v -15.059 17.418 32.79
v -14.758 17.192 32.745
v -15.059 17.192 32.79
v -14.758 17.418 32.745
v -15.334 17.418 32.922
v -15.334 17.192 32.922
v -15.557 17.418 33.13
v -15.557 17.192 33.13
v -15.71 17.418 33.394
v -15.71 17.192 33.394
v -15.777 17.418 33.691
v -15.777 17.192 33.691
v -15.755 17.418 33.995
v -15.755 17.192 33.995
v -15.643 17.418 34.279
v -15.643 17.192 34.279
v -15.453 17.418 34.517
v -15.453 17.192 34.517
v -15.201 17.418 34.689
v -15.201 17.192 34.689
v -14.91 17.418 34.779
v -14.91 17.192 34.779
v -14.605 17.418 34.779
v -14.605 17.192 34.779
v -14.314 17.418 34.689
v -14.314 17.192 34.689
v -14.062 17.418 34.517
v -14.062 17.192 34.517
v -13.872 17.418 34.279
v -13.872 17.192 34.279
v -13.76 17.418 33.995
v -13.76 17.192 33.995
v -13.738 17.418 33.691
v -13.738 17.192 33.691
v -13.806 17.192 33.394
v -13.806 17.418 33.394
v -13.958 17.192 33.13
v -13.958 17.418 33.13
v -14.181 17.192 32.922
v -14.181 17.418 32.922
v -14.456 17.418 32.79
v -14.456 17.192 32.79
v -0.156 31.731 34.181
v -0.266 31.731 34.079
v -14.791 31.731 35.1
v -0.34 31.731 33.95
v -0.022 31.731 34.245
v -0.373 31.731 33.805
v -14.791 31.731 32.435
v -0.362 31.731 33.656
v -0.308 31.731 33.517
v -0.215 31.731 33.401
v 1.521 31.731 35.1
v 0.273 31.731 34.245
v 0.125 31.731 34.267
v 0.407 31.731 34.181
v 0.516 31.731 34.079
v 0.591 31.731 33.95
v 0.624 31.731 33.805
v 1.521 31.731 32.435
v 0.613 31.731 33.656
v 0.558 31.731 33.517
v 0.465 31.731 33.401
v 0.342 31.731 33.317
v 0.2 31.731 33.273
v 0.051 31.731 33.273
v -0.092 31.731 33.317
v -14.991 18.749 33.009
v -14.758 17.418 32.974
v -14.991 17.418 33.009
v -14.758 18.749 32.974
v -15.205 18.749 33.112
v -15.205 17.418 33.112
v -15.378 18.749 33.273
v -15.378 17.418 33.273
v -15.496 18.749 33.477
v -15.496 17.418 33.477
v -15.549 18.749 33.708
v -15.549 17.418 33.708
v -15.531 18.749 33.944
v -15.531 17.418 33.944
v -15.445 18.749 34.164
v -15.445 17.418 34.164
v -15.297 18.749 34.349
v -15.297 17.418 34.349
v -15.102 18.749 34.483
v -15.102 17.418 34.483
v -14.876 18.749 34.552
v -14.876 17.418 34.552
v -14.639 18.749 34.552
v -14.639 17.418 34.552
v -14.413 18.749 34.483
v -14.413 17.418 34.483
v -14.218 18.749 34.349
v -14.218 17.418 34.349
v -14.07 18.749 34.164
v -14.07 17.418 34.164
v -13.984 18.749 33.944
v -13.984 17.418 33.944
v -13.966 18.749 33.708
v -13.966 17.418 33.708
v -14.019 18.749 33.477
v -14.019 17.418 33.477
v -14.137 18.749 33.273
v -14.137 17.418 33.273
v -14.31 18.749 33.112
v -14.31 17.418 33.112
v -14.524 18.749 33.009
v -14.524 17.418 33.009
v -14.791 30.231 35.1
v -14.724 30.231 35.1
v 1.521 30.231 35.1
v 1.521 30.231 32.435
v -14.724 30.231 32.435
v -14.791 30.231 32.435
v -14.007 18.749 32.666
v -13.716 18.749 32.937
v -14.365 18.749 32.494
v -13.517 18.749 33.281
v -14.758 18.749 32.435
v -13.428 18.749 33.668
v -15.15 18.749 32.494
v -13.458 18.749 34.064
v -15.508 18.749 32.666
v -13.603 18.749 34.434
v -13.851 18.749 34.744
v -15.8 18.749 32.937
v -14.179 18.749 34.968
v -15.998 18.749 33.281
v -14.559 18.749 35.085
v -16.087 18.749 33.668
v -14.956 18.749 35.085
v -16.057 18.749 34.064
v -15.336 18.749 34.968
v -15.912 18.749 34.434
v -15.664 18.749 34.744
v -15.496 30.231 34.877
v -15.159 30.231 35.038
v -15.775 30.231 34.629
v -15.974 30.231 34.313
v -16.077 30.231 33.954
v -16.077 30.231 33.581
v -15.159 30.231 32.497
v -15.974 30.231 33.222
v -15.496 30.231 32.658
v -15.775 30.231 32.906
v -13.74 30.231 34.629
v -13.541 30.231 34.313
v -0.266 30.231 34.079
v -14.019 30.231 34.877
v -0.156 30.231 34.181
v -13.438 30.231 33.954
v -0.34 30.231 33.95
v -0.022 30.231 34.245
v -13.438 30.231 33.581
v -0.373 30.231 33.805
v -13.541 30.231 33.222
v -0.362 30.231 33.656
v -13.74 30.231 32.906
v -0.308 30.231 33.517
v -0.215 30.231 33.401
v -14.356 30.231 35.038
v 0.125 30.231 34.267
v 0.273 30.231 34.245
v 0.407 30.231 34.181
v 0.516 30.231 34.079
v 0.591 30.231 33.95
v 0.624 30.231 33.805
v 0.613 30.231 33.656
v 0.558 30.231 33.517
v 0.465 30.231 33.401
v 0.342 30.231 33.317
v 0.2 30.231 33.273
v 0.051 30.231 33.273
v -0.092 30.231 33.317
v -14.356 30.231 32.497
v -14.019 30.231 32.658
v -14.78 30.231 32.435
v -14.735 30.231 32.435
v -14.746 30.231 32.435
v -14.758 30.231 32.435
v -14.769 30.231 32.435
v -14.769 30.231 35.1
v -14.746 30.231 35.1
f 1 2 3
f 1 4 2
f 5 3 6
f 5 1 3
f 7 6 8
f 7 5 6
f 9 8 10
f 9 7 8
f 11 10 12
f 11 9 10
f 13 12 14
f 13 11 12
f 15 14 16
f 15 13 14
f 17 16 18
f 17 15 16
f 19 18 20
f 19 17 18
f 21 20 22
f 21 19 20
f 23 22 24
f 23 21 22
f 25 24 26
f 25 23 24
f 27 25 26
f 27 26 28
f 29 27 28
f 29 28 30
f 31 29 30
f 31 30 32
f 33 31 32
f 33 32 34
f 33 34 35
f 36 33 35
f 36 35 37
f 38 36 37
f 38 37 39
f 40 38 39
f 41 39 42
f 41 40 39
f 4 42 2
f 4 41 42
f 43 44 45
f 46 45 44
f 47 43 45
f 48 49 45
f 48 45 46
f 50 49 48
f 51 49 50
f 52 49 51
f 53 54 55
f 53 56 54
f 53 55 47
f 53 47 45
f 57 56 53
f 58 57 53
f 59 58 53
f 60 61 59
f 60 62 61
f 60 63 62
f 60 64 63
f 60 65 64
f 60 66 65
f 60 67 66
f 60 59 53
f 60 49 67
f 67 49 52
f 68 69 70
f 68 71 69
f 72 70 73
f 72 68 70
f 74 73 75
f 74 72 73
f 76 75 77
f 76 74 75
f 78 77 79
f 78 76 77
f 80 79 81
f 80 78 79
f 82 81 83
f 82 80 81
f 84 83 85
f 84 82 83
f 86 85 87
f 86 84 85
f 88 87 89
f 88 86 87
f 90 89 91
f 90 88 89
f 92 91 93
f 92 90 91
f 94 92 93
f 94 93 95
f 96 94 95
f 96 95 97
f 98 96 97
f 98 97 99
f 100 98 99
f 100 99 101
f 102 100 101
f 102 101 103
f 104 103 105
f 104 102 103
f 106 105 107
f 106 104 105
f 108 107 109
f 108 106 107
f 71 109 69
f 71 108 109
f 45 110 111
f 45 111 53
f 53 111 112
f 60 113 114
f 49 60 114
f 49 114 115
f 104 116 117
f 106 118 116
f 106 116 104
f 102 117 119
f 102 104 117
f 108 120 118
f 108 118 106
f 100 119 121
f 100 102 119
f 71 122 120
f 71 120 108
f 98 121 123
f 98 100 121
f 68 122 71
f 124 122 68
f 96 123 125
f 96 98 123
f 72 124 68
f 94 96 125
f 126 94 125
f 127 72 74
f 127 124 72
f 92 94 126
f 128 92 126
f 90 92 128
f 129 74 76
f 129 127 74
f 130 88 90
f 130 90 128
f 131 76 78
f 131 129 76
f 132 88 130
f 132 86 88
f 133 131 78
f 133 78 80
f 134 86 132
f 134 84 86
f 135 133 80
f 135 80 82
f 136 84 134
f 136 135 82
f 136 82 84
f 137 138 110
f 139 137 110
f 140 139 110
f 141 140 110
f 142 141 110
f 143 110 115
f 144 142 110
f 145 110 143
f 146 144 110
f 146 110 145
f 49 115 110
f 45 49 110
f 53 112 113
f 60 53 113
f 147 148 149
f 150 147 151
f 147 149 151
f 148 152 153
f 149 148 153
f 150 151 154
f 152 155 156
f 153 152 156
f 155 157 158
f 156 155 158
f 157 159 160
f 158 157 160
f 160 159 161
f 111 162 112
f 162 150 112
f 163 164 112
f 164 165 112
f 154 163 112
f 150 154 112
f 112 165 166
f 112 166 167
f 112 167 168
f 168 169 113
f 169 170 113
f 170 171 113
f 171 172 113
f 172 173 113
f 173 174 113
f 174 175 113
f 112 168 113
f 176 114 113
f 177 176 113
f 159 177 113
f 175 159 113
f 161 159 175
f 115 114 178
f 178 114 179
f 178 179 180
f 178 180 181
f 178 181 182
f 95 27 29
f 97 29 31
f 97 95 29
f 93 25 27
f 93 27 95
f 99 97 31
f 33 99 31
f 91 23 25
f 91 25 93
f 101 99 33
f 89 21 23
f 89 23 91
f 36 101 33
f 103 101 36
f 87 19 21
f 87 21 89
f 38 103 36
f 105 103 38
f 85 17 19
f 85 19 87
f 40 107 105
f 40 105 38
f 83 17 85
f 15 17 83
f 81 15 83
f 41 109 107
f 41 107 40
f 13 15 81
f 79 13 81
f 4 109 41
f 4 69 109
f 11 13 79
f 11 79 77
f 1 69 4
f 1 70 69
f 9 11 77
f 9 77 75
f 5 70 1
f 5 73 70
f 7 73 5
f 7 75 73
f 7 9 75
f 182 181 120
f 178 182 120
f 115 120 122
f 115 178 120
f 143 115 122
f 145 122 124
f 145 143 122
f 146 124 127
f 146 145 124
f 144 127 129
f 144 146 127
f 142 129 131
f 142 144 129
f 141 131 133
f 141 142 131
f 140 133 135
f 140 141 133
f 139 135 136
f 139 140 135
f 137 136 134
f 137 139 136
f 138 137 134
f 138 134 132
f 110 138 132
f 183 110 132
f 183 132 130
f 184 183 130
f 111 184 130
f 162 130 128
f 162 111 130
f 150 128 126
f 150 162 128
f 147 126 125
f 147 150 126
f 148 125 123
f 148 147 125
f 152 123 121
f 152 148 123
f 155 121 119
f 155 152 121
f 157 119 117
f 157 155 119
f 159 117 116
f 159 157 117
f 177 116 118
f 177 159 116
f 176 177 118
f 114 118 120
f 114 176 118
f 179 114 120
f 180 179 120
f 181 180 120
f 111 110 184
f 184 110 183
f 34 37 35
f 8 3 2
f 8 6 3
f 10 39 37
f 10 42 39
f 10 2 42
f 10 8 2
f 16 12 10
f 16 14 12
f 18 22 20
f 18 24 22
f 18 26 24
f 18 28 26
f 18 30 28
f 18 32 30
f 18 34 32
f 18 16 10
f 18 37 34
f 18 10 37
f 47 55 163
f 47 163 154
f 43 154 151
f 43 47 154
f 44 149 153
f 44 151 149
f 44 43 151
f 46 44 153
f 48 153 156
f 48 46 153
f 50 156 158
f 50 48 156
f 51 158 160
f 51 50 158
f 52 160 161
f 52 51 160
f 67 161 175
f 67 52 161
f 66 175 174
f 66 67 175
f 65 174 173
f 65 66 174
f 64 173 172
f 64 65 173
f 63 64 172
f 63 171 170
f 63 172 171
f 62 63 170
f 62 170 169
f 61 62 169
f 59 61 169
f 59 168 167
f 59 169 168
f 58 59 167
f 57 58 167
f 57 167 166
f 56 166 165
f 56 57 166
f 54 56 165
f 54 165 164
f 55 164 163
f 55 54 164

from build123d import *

# Parameters (mm, degrees)
BOSS_EXTRUDE1_DEPTH     = 1.5
CUT_EXTRUDE1_DEPTH      = 41.754559874
CUT_EXTRUDE1_DEPTH_BACK = 41.754559874
SKETCH6_R               = 0.5


with BuildPart() as part:
    # Sketch1 → Revolve1 (revolve)
    with BuildSketch(Plane(origin=(-14.777648988, 30.214835565, 34.561537757), x_dir=(-0.025322831104622072, 0, 0.9996793256964189), z_dir=(0.9996793256964189, 0, 0.025322831104622072)), mode=Mode.PRIVATE) as revolve1_sk:
        Polygon((0.538461916, -0.016033073), (-0.794313715, -0.016033073), (-0.794313715, 12.79633963), (-0.794313715, 13.022686392), (0.228391261, 13.022686392), (0.228391261, 12.79633963), (-0.000563715, 12.79633963), (-0.000563715, 11.466008099), (0.538461916, 11.466008099), align=None)
    revolve(revolve1_sk.sketch.rotate(Axis((-14.757534716, 30.388488917, 33.767478758), (0, 1, 0)), 181.451046455), axis=Axis((-14.757534716, 30.388488917, 33.767478758), (0, 1, 0)))

    # Sketch5 → Boss-Extrude1 (add)
    with BuildSketch(Plane(origin=(0, 30.230868638, 0), x_dir=(1, 0, 0), z_dir=(0, 1, 0))):
        Polygon((-14.723785064, -32.435130513), (-14.791284368, -32.435130513), (-14.791284368, -35.099827002), (-14.723785064, -35.099827002), (1.521158766, -35.099827002), (1.521158766, -32.435130513), align=None)
    extrude(amount=BOSS_EXTRUDE1_DEPTH)

    # Sketch6 → Cut-Extrude1 (cut, two sides: drawn at the far end of the back side and taken through both)
    with BuildSketch(Plane.XZ.offset(-30.230868638).offset(-CUT_EXTRUDE1_DEPTH_BACK)):
        with Locations(Location((0.125166735, 33.767478758, 0), (0, 0, 90))):
            Circle(SKETCH6_R)
    extrude(amount=CUT_EXTRUDE1_DEPTH + CUT_EXTRUDE1_DEPTH_BACK, mode=Mode.SUBTRACT)


solid = part.part
